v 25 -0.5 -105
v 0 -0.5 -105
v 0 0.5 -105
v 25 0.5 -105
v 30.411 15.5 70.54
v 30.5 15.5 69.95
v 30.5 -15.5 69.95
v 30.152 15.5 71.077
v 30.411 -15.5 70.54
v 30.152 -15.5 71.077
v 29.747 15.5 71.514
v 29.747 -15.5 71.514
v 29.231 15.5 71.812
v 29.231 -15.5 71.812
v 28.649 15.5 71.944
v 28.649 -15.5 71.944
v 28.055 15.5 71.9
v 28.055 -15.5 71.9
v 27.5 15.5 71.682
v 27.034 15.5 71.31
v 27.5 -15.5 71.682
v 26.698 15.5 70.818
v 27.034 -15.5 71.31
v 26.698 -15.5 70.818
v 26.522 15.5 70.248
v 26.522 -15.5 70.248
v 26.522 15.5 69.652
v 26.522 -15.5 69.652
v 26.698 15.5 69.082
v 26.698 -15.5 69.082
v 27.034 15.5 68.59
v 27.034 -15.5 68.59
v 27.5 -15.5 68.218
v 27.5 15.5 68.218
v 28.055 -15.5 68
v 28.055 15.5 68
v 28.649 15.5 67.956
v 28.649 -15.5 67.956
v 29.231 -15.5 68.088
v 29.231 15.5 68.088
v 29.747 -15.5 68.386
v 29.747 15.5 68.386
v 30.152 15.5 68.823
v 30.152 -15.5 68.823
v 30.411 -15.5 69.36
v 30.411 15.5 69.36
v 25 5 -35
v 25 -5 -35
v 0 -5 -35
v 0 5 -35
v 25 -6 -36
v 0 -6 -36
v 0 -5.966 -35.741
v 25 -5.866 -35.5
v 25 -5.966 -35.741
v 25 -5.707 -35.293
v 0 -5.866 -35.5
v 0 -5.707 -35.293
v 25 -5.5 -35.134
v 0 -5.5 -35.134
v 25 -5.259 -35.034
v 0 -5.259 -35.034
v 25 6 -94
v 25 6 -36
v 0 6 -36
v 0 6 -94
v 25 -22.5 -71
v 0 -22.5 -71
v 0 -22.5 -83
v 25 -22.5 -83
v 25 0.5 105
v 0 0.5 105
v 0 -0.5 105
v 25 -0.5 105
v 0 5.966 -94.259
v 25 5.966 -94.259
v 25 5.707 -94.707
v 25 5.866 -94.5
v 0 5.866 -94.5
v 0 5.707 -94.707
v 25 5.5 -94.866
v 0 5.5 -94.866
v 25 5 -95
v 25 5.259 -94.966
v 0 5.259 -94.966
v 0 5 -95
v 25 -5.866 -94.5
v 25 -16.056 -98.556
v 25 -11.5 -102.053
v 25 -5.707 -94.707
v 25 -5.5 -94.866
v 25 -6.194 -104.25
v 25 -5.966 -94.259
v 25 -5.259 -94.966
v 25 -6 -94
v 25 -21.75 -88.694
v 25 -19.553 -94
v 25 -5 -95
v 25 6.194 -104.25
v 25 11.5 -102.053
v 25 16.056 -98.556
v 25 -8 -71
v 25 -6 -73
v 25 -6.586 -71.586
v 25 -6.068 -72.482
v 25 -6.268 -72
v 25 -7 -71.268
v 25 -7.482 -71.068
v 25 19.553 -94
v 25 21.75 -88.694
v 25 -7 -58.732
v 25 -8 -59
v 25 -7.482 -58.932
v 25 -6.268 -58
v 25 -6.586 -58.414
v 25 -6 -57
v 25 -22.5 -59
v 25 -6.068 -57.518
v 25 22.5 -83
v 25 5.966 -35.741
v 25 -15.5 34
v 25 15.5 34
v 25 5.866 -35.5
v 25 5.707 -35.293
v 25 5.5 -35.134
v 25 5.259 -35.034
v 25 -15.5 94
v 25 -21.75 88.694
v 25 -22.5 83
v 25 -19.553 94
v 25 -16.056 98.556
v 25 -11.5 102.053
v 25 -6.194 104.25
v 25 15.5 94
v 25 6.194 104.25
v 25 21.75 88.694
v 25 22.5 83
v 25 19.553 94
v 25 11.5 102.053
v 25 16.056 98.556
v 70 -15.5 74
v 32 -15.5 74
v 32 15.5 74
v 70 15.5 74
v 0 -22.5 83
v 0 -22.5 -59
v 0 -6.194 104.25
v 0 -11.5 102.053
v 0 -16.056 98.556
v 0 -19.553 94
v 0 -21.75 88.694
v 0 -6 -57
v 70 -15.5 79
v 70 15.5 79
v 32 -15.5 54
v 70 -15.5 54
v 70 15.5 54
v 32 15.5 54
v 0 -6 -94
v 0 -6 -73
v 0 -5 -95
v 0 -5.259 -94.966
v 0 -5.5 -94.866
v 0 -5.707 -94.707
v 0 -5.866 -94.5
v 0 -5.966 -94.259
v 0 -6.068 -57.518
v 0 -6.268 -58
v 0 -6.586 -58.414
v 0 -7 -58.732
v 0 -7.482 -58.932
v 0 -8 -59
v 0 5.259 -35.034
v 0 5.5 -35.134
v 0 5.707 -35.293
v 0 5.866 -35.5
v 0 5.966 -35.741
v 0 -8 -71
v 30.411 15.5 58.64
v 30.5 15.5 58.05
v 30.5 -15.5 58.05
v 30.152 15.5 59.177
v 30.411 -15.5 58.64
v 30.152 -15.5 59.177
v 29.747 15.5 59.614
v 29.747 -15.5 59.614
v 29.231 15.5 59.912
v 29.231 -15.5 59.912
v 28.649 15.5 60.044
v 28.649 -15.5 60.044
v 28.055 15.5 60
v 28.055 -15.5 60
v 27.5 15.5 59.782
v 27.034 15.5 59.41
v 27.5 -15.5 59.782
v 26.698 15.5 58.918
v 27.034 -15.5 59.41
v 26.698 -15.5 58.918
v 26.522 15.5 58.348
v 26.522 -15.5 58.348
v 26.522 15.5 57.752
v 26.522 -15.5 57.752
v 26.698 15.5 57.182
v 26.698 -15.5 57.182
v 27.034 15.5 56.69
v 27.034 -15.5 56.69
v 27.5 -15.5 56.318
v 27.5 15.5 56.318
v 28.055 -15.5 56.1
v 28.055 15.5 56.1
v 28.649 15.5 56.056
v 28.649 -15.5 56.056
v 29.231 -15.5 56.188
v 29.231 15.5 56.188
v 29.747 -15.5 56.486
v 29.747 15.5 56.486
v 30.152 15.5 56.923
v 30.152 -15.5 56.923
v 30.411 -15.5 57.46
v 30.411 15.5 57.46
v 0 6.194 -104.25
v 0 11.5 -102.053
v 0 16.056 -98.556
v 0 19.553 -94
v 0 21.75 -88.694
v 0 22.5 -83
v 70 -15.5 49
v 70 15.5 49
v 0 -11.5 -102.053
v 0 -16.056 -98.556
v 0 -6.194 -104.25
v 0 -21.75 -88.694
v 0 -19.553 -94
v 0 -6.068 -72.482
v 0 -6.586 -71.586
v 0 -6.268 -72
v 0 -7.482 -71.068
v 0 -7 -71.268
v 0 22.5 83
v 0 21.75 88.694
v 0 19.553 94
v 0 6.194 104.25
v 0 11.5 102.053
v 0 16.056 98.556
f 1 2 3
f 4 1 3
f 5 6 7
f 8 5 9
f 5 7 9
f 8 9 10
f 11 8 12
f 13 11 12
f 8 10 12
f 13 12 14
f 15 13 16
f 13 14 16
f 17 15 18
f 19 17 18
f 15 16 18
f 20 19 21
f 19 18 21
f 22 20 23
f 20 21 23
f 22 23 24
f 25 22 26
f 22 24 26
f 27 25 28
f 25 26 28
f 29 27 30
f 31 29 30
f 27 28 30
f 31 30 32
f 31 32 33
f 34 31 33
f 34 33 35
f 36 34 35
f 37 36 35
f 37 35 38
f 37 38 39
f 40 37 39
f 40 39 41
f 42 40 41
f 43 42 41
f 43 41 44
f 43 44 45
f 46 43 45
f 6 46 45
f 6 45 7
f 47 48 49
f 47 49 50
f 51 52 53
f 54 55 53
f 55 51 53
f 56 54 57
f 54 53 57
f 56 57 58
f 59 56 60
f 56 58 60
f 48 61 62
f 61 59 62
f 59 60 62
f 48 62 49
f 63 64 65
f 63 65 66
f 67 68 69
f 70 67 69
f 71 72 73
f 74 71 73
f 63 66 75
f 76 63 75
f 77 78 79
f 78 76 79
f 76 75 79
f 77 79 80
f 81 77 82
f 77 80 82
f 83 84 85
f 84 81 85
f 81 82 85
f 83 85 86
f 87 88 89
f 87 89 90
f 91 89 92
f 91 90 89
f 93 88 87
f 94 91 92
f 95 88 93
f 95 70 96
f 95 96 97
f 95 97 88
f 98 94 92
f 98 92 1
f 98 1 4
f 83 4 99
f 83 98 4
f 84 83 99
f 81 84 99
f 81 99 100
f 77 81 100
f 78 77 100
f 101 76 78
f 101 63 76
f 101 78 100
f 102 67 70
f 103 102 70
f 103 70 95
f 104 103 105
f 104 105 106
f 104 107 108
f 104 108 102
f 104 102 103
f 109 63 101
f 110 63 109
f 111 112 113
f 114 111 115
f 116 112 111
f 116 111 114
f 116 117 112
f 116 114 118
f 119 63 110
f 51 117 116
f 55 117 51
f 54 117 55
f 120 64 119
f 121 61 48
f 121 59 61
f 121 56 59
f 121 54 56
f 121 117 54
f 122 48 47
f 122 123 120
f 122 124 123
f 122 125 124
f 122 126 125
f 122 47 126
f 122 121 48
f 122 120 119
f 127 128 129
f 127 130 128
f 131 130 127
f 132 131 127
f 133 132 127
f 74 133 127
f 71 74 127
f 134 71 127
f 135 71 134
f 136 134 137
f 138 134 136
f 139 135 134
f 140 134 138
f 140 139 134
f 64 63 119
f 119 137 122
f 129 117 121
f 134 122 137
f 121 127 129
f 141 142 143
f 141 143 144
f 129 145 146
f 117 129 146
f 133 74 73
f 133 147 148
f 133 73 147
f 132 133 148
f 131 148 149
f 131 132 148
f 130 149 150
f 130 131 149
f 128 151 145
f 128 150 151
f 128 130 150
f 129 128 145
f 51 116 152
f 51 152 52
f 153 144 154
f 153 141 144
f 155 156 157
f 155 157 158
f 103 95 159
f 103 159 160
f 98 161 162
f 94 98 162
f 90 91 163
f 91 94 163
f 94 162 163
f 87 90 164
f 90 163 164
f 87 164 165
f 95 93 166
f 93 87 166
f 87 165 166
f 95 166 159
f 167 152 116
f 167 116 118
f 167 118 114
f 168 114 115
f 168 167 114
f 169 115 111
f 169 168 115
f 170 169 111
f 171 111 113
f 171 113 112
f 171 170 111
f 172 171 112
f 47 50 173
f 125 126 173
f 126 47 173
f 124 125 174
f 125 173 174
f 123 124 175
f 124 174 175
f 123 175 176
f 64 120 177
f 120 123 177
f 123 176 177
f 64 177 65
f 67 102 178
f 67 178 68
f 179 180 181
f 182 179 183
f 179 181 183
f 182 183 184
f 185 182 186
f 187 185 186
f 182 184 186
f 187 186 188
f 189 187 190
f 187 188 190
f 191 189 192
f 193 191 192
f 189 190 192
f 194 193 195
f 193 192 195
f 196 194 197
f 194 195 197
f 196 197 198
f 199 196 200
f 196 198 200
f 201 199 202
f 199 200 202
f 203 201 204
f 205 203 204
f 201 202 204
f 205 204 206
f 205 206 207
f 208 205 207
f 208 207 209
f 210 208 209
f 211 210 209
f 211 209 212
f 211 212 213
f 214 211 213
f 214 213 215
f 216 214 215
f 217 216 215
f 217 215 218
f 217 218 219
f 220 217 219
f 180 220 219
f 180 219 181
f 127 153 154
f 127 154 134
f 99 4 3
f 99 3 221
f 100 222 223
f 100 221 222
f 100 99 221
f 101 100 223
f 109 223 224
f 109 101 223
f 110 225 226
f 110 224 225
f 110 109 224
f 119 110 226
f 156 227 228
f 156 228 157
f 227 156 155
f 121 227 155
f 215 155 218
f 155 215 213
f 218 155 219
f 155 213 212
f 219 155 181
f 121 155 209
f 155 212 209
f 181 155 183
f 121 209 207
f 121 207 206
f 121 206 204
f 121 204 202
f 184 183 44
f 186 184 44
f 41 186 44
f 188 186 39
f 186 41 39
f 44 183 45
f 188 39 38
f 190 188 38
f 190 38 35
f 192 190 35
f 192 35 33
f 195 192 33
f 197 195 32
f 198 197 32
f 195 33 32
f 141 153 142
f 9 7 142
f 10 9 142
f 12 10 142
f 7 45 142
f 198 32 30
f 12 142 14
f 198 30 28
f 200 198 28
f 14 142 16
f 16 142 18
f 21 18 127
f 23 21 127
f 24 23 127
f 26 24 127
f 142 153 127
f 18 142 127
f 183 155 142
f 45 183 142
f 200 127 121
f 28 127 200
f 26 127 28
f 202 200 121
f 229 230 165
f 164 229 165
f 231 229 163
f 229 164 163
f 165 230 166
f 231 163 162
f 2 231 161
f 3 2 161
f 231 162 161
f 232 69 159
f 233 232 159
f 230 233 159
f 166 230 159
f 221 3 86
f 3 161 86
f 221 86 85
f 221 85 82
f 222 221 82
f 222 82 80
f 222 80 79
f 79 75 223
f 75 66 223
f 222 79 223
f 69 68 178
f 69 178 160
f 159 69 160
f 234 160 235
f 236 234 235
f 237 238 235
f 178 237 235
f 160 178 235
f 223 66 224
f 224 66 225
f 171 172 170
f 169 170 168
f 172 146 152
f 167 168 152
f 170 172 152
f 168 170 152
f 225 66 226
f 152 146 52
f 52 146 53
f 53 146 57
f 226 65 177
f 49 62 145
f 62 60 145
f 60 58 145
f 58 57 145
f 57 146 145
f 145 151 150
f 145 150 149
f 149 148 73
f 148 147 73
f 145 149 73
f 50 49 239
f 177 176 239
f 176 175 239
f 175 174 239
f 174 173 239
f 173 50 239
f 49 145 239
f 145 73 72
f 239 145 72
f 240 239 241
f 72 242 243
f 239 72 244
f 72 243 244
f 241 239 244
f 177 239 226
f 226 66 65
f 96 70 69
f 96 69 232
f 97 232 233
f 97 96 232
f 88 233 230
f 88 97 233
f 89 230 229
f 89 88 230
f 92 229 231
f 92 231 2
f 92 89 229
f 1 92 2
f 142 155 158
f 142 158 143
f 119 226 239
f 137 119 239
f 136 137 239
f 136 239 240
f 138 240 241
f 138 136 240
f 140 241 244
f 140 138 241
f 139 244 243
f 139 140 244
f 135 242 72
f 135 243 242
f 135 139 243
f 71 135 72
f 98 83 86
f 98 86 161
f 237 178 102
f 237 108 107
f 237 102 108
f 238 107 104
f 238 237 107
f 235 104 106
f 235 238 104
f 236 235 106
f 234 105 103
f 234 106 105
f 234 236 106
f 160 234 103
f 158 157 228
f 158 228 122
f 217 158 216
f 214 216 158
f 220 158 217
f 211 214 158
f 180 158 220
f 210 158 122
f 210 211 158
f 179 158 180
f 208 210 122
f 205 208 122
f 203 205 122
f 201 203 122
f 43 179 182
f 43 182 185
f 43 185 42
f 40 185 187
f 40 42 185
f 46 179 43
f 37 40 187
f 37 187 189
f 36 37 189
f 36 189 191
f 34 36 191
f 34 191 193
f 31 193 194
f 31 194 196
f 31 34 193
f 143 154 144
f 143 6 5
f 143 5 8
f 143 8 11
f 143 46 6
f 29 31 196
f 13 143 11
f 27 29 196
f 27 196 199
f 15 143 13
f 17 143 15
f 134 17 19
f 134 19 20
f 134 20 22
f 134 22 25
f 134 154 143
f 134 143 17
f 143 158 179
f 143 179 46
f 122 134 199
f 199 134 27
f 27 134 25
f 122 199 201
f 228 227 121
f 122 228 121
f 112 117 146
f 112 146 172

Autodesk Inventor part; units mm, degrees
ref_plane "YZ Plane" through (0, 0, 0) normal (1, 0, 0) x (0, 1, 0)
ref_plane "XZ Plane" through (0, 0, 0) normal (0, 1, 0) x (-1, 0, 0)
ref_plane "XY Plane" through (0, 0, 0) normal (0, 0, 1) x (1, 0, 0)
sketch "草圖1" plane through (0, 0, 0) normal (1, 0, 0) x (0, 1, 0)
  line L0 (-22.5, -105) -> (22.5, -105)
  line L1 (22.5, -105) -> (22.5, 105)
  line L2 (22.5, 105) -> (-22.5, 105)
  line L3 (-22.5, 105) -> (-22.5, -105)
  line L4 (-22.5, -105) -> (22.5, 105) construction
  line L5 (22.5, -105) -> (-22.5, 105) construction
  point P0 (0, 0)
  dimension "d0" = 210
  dimension "d1" = 45
extrude "擠出1" add sketch "草圖1" along normal blind 25
fillet "圓角1" radius 22 4 edges at (12.5, 22.5, 105) (12.5, -22.5, 105) (12.5, 22.5, -105) (12.5, -22.5, -105)
sketch "草圖2" plane through (25, 0, 0) normal (1, 0, 0) x (0, 0, -1)
  line L0 (35, 6) -> (95, 6)
  line L1 (95, 6) -> (95, -6)
  line L2 (35, -6) -> (35, 6)
  line L3 (71, -6) -> (71, -22.5)
  line L4 (71, -22.5) -> (59, -22.5)
  line L5 (59, -22.5) -> (59, -6)
  line L6 (0, 0) -> (51.0559, 0) construction
  line L7 (95, -6) -> (71, -6)
  line L8 (59, -6) -> (35, -6)
  line L9 (65, -22.5) -> (65, 6) construction
  line L10 (-83, -22.5) -> (83, -22.5) construction
  line L11 (105, -0.5) -> (105, 0.5) projected
  dimension "d5" = 12
  dimension "d6" = 60
  dimension "d7" = 12
  dimension "d8" = 10
extrude "擠出2" cut sketch "草圖2" against normal blind 25
fillet "圓角2" radius 1 4 edges at (12.5, 6, -35) (12.5, -6, -35) (12.5, 6, -95) (12.5, -6, -95)
fillet "圓角3" radius 2 2 edges at (12.5, -6, -59) (12.5, -6, -71)
sketch "草圖3" plane through (0, 0, 0) normal (0, 1, 0) x (-1, 0, 0)
  line L0 (-25, 94) -> (-25, 34)
  line L1 (-70, 79) -> (-25, 94)
  line L2 (-70, 49) -> (-25, 34)
  line L3 (-32, 74) -> (-70, 74)
  line L4 (-70, 54) -> (-32, 54)
  line L5 (-32, 54) -> (-32, 74)
  line L6 (-70, 49) -> (-70, 54)
  line L7 (-70, 74) -> (-70, 79)
  line L8 (-32, 64) -> (-25, 64) construction
  line L9 (-25, 83) -> (-25, -59) construction
  line L10 (0, -59) -> (-25, -59) projected
  point P0 (0, 0)
  dimension "d13" = 113
  dimension "d14" = 20
  dimension "d15" = 5
  dimension "d16" = 20
  dimension "d17" = 45
  dimension "d21" = 38
extrude "擠出3" add sketch "草圖3" along normal mid plane 31
sketch "草圖4" plane through (0, -15.5, 0) normal (0, -1, 0) x (1, 0, 0)
  circle A0 centre (28.5, 69.95) radius 2
  circle A1 centre (28.5, 58.05) radius 2
  line L0 (25, 105) -> (25, 83) construction
  line L1 (70, 64) -> (28.5, 64) construction
  line L2 (70, 74) -> (32, 74) construction
  line L3 (32, 54) -> (70, 54) construction
  point P0 (0, 0)
  dimension "d22" = 3.5
  dimension "d23" = 4
  dimension "d24" = 11.9
  dimension "d25" = 10
extrude "擠出4" cut sketch "草圖4" against normal blind 31
properties part number "base"
